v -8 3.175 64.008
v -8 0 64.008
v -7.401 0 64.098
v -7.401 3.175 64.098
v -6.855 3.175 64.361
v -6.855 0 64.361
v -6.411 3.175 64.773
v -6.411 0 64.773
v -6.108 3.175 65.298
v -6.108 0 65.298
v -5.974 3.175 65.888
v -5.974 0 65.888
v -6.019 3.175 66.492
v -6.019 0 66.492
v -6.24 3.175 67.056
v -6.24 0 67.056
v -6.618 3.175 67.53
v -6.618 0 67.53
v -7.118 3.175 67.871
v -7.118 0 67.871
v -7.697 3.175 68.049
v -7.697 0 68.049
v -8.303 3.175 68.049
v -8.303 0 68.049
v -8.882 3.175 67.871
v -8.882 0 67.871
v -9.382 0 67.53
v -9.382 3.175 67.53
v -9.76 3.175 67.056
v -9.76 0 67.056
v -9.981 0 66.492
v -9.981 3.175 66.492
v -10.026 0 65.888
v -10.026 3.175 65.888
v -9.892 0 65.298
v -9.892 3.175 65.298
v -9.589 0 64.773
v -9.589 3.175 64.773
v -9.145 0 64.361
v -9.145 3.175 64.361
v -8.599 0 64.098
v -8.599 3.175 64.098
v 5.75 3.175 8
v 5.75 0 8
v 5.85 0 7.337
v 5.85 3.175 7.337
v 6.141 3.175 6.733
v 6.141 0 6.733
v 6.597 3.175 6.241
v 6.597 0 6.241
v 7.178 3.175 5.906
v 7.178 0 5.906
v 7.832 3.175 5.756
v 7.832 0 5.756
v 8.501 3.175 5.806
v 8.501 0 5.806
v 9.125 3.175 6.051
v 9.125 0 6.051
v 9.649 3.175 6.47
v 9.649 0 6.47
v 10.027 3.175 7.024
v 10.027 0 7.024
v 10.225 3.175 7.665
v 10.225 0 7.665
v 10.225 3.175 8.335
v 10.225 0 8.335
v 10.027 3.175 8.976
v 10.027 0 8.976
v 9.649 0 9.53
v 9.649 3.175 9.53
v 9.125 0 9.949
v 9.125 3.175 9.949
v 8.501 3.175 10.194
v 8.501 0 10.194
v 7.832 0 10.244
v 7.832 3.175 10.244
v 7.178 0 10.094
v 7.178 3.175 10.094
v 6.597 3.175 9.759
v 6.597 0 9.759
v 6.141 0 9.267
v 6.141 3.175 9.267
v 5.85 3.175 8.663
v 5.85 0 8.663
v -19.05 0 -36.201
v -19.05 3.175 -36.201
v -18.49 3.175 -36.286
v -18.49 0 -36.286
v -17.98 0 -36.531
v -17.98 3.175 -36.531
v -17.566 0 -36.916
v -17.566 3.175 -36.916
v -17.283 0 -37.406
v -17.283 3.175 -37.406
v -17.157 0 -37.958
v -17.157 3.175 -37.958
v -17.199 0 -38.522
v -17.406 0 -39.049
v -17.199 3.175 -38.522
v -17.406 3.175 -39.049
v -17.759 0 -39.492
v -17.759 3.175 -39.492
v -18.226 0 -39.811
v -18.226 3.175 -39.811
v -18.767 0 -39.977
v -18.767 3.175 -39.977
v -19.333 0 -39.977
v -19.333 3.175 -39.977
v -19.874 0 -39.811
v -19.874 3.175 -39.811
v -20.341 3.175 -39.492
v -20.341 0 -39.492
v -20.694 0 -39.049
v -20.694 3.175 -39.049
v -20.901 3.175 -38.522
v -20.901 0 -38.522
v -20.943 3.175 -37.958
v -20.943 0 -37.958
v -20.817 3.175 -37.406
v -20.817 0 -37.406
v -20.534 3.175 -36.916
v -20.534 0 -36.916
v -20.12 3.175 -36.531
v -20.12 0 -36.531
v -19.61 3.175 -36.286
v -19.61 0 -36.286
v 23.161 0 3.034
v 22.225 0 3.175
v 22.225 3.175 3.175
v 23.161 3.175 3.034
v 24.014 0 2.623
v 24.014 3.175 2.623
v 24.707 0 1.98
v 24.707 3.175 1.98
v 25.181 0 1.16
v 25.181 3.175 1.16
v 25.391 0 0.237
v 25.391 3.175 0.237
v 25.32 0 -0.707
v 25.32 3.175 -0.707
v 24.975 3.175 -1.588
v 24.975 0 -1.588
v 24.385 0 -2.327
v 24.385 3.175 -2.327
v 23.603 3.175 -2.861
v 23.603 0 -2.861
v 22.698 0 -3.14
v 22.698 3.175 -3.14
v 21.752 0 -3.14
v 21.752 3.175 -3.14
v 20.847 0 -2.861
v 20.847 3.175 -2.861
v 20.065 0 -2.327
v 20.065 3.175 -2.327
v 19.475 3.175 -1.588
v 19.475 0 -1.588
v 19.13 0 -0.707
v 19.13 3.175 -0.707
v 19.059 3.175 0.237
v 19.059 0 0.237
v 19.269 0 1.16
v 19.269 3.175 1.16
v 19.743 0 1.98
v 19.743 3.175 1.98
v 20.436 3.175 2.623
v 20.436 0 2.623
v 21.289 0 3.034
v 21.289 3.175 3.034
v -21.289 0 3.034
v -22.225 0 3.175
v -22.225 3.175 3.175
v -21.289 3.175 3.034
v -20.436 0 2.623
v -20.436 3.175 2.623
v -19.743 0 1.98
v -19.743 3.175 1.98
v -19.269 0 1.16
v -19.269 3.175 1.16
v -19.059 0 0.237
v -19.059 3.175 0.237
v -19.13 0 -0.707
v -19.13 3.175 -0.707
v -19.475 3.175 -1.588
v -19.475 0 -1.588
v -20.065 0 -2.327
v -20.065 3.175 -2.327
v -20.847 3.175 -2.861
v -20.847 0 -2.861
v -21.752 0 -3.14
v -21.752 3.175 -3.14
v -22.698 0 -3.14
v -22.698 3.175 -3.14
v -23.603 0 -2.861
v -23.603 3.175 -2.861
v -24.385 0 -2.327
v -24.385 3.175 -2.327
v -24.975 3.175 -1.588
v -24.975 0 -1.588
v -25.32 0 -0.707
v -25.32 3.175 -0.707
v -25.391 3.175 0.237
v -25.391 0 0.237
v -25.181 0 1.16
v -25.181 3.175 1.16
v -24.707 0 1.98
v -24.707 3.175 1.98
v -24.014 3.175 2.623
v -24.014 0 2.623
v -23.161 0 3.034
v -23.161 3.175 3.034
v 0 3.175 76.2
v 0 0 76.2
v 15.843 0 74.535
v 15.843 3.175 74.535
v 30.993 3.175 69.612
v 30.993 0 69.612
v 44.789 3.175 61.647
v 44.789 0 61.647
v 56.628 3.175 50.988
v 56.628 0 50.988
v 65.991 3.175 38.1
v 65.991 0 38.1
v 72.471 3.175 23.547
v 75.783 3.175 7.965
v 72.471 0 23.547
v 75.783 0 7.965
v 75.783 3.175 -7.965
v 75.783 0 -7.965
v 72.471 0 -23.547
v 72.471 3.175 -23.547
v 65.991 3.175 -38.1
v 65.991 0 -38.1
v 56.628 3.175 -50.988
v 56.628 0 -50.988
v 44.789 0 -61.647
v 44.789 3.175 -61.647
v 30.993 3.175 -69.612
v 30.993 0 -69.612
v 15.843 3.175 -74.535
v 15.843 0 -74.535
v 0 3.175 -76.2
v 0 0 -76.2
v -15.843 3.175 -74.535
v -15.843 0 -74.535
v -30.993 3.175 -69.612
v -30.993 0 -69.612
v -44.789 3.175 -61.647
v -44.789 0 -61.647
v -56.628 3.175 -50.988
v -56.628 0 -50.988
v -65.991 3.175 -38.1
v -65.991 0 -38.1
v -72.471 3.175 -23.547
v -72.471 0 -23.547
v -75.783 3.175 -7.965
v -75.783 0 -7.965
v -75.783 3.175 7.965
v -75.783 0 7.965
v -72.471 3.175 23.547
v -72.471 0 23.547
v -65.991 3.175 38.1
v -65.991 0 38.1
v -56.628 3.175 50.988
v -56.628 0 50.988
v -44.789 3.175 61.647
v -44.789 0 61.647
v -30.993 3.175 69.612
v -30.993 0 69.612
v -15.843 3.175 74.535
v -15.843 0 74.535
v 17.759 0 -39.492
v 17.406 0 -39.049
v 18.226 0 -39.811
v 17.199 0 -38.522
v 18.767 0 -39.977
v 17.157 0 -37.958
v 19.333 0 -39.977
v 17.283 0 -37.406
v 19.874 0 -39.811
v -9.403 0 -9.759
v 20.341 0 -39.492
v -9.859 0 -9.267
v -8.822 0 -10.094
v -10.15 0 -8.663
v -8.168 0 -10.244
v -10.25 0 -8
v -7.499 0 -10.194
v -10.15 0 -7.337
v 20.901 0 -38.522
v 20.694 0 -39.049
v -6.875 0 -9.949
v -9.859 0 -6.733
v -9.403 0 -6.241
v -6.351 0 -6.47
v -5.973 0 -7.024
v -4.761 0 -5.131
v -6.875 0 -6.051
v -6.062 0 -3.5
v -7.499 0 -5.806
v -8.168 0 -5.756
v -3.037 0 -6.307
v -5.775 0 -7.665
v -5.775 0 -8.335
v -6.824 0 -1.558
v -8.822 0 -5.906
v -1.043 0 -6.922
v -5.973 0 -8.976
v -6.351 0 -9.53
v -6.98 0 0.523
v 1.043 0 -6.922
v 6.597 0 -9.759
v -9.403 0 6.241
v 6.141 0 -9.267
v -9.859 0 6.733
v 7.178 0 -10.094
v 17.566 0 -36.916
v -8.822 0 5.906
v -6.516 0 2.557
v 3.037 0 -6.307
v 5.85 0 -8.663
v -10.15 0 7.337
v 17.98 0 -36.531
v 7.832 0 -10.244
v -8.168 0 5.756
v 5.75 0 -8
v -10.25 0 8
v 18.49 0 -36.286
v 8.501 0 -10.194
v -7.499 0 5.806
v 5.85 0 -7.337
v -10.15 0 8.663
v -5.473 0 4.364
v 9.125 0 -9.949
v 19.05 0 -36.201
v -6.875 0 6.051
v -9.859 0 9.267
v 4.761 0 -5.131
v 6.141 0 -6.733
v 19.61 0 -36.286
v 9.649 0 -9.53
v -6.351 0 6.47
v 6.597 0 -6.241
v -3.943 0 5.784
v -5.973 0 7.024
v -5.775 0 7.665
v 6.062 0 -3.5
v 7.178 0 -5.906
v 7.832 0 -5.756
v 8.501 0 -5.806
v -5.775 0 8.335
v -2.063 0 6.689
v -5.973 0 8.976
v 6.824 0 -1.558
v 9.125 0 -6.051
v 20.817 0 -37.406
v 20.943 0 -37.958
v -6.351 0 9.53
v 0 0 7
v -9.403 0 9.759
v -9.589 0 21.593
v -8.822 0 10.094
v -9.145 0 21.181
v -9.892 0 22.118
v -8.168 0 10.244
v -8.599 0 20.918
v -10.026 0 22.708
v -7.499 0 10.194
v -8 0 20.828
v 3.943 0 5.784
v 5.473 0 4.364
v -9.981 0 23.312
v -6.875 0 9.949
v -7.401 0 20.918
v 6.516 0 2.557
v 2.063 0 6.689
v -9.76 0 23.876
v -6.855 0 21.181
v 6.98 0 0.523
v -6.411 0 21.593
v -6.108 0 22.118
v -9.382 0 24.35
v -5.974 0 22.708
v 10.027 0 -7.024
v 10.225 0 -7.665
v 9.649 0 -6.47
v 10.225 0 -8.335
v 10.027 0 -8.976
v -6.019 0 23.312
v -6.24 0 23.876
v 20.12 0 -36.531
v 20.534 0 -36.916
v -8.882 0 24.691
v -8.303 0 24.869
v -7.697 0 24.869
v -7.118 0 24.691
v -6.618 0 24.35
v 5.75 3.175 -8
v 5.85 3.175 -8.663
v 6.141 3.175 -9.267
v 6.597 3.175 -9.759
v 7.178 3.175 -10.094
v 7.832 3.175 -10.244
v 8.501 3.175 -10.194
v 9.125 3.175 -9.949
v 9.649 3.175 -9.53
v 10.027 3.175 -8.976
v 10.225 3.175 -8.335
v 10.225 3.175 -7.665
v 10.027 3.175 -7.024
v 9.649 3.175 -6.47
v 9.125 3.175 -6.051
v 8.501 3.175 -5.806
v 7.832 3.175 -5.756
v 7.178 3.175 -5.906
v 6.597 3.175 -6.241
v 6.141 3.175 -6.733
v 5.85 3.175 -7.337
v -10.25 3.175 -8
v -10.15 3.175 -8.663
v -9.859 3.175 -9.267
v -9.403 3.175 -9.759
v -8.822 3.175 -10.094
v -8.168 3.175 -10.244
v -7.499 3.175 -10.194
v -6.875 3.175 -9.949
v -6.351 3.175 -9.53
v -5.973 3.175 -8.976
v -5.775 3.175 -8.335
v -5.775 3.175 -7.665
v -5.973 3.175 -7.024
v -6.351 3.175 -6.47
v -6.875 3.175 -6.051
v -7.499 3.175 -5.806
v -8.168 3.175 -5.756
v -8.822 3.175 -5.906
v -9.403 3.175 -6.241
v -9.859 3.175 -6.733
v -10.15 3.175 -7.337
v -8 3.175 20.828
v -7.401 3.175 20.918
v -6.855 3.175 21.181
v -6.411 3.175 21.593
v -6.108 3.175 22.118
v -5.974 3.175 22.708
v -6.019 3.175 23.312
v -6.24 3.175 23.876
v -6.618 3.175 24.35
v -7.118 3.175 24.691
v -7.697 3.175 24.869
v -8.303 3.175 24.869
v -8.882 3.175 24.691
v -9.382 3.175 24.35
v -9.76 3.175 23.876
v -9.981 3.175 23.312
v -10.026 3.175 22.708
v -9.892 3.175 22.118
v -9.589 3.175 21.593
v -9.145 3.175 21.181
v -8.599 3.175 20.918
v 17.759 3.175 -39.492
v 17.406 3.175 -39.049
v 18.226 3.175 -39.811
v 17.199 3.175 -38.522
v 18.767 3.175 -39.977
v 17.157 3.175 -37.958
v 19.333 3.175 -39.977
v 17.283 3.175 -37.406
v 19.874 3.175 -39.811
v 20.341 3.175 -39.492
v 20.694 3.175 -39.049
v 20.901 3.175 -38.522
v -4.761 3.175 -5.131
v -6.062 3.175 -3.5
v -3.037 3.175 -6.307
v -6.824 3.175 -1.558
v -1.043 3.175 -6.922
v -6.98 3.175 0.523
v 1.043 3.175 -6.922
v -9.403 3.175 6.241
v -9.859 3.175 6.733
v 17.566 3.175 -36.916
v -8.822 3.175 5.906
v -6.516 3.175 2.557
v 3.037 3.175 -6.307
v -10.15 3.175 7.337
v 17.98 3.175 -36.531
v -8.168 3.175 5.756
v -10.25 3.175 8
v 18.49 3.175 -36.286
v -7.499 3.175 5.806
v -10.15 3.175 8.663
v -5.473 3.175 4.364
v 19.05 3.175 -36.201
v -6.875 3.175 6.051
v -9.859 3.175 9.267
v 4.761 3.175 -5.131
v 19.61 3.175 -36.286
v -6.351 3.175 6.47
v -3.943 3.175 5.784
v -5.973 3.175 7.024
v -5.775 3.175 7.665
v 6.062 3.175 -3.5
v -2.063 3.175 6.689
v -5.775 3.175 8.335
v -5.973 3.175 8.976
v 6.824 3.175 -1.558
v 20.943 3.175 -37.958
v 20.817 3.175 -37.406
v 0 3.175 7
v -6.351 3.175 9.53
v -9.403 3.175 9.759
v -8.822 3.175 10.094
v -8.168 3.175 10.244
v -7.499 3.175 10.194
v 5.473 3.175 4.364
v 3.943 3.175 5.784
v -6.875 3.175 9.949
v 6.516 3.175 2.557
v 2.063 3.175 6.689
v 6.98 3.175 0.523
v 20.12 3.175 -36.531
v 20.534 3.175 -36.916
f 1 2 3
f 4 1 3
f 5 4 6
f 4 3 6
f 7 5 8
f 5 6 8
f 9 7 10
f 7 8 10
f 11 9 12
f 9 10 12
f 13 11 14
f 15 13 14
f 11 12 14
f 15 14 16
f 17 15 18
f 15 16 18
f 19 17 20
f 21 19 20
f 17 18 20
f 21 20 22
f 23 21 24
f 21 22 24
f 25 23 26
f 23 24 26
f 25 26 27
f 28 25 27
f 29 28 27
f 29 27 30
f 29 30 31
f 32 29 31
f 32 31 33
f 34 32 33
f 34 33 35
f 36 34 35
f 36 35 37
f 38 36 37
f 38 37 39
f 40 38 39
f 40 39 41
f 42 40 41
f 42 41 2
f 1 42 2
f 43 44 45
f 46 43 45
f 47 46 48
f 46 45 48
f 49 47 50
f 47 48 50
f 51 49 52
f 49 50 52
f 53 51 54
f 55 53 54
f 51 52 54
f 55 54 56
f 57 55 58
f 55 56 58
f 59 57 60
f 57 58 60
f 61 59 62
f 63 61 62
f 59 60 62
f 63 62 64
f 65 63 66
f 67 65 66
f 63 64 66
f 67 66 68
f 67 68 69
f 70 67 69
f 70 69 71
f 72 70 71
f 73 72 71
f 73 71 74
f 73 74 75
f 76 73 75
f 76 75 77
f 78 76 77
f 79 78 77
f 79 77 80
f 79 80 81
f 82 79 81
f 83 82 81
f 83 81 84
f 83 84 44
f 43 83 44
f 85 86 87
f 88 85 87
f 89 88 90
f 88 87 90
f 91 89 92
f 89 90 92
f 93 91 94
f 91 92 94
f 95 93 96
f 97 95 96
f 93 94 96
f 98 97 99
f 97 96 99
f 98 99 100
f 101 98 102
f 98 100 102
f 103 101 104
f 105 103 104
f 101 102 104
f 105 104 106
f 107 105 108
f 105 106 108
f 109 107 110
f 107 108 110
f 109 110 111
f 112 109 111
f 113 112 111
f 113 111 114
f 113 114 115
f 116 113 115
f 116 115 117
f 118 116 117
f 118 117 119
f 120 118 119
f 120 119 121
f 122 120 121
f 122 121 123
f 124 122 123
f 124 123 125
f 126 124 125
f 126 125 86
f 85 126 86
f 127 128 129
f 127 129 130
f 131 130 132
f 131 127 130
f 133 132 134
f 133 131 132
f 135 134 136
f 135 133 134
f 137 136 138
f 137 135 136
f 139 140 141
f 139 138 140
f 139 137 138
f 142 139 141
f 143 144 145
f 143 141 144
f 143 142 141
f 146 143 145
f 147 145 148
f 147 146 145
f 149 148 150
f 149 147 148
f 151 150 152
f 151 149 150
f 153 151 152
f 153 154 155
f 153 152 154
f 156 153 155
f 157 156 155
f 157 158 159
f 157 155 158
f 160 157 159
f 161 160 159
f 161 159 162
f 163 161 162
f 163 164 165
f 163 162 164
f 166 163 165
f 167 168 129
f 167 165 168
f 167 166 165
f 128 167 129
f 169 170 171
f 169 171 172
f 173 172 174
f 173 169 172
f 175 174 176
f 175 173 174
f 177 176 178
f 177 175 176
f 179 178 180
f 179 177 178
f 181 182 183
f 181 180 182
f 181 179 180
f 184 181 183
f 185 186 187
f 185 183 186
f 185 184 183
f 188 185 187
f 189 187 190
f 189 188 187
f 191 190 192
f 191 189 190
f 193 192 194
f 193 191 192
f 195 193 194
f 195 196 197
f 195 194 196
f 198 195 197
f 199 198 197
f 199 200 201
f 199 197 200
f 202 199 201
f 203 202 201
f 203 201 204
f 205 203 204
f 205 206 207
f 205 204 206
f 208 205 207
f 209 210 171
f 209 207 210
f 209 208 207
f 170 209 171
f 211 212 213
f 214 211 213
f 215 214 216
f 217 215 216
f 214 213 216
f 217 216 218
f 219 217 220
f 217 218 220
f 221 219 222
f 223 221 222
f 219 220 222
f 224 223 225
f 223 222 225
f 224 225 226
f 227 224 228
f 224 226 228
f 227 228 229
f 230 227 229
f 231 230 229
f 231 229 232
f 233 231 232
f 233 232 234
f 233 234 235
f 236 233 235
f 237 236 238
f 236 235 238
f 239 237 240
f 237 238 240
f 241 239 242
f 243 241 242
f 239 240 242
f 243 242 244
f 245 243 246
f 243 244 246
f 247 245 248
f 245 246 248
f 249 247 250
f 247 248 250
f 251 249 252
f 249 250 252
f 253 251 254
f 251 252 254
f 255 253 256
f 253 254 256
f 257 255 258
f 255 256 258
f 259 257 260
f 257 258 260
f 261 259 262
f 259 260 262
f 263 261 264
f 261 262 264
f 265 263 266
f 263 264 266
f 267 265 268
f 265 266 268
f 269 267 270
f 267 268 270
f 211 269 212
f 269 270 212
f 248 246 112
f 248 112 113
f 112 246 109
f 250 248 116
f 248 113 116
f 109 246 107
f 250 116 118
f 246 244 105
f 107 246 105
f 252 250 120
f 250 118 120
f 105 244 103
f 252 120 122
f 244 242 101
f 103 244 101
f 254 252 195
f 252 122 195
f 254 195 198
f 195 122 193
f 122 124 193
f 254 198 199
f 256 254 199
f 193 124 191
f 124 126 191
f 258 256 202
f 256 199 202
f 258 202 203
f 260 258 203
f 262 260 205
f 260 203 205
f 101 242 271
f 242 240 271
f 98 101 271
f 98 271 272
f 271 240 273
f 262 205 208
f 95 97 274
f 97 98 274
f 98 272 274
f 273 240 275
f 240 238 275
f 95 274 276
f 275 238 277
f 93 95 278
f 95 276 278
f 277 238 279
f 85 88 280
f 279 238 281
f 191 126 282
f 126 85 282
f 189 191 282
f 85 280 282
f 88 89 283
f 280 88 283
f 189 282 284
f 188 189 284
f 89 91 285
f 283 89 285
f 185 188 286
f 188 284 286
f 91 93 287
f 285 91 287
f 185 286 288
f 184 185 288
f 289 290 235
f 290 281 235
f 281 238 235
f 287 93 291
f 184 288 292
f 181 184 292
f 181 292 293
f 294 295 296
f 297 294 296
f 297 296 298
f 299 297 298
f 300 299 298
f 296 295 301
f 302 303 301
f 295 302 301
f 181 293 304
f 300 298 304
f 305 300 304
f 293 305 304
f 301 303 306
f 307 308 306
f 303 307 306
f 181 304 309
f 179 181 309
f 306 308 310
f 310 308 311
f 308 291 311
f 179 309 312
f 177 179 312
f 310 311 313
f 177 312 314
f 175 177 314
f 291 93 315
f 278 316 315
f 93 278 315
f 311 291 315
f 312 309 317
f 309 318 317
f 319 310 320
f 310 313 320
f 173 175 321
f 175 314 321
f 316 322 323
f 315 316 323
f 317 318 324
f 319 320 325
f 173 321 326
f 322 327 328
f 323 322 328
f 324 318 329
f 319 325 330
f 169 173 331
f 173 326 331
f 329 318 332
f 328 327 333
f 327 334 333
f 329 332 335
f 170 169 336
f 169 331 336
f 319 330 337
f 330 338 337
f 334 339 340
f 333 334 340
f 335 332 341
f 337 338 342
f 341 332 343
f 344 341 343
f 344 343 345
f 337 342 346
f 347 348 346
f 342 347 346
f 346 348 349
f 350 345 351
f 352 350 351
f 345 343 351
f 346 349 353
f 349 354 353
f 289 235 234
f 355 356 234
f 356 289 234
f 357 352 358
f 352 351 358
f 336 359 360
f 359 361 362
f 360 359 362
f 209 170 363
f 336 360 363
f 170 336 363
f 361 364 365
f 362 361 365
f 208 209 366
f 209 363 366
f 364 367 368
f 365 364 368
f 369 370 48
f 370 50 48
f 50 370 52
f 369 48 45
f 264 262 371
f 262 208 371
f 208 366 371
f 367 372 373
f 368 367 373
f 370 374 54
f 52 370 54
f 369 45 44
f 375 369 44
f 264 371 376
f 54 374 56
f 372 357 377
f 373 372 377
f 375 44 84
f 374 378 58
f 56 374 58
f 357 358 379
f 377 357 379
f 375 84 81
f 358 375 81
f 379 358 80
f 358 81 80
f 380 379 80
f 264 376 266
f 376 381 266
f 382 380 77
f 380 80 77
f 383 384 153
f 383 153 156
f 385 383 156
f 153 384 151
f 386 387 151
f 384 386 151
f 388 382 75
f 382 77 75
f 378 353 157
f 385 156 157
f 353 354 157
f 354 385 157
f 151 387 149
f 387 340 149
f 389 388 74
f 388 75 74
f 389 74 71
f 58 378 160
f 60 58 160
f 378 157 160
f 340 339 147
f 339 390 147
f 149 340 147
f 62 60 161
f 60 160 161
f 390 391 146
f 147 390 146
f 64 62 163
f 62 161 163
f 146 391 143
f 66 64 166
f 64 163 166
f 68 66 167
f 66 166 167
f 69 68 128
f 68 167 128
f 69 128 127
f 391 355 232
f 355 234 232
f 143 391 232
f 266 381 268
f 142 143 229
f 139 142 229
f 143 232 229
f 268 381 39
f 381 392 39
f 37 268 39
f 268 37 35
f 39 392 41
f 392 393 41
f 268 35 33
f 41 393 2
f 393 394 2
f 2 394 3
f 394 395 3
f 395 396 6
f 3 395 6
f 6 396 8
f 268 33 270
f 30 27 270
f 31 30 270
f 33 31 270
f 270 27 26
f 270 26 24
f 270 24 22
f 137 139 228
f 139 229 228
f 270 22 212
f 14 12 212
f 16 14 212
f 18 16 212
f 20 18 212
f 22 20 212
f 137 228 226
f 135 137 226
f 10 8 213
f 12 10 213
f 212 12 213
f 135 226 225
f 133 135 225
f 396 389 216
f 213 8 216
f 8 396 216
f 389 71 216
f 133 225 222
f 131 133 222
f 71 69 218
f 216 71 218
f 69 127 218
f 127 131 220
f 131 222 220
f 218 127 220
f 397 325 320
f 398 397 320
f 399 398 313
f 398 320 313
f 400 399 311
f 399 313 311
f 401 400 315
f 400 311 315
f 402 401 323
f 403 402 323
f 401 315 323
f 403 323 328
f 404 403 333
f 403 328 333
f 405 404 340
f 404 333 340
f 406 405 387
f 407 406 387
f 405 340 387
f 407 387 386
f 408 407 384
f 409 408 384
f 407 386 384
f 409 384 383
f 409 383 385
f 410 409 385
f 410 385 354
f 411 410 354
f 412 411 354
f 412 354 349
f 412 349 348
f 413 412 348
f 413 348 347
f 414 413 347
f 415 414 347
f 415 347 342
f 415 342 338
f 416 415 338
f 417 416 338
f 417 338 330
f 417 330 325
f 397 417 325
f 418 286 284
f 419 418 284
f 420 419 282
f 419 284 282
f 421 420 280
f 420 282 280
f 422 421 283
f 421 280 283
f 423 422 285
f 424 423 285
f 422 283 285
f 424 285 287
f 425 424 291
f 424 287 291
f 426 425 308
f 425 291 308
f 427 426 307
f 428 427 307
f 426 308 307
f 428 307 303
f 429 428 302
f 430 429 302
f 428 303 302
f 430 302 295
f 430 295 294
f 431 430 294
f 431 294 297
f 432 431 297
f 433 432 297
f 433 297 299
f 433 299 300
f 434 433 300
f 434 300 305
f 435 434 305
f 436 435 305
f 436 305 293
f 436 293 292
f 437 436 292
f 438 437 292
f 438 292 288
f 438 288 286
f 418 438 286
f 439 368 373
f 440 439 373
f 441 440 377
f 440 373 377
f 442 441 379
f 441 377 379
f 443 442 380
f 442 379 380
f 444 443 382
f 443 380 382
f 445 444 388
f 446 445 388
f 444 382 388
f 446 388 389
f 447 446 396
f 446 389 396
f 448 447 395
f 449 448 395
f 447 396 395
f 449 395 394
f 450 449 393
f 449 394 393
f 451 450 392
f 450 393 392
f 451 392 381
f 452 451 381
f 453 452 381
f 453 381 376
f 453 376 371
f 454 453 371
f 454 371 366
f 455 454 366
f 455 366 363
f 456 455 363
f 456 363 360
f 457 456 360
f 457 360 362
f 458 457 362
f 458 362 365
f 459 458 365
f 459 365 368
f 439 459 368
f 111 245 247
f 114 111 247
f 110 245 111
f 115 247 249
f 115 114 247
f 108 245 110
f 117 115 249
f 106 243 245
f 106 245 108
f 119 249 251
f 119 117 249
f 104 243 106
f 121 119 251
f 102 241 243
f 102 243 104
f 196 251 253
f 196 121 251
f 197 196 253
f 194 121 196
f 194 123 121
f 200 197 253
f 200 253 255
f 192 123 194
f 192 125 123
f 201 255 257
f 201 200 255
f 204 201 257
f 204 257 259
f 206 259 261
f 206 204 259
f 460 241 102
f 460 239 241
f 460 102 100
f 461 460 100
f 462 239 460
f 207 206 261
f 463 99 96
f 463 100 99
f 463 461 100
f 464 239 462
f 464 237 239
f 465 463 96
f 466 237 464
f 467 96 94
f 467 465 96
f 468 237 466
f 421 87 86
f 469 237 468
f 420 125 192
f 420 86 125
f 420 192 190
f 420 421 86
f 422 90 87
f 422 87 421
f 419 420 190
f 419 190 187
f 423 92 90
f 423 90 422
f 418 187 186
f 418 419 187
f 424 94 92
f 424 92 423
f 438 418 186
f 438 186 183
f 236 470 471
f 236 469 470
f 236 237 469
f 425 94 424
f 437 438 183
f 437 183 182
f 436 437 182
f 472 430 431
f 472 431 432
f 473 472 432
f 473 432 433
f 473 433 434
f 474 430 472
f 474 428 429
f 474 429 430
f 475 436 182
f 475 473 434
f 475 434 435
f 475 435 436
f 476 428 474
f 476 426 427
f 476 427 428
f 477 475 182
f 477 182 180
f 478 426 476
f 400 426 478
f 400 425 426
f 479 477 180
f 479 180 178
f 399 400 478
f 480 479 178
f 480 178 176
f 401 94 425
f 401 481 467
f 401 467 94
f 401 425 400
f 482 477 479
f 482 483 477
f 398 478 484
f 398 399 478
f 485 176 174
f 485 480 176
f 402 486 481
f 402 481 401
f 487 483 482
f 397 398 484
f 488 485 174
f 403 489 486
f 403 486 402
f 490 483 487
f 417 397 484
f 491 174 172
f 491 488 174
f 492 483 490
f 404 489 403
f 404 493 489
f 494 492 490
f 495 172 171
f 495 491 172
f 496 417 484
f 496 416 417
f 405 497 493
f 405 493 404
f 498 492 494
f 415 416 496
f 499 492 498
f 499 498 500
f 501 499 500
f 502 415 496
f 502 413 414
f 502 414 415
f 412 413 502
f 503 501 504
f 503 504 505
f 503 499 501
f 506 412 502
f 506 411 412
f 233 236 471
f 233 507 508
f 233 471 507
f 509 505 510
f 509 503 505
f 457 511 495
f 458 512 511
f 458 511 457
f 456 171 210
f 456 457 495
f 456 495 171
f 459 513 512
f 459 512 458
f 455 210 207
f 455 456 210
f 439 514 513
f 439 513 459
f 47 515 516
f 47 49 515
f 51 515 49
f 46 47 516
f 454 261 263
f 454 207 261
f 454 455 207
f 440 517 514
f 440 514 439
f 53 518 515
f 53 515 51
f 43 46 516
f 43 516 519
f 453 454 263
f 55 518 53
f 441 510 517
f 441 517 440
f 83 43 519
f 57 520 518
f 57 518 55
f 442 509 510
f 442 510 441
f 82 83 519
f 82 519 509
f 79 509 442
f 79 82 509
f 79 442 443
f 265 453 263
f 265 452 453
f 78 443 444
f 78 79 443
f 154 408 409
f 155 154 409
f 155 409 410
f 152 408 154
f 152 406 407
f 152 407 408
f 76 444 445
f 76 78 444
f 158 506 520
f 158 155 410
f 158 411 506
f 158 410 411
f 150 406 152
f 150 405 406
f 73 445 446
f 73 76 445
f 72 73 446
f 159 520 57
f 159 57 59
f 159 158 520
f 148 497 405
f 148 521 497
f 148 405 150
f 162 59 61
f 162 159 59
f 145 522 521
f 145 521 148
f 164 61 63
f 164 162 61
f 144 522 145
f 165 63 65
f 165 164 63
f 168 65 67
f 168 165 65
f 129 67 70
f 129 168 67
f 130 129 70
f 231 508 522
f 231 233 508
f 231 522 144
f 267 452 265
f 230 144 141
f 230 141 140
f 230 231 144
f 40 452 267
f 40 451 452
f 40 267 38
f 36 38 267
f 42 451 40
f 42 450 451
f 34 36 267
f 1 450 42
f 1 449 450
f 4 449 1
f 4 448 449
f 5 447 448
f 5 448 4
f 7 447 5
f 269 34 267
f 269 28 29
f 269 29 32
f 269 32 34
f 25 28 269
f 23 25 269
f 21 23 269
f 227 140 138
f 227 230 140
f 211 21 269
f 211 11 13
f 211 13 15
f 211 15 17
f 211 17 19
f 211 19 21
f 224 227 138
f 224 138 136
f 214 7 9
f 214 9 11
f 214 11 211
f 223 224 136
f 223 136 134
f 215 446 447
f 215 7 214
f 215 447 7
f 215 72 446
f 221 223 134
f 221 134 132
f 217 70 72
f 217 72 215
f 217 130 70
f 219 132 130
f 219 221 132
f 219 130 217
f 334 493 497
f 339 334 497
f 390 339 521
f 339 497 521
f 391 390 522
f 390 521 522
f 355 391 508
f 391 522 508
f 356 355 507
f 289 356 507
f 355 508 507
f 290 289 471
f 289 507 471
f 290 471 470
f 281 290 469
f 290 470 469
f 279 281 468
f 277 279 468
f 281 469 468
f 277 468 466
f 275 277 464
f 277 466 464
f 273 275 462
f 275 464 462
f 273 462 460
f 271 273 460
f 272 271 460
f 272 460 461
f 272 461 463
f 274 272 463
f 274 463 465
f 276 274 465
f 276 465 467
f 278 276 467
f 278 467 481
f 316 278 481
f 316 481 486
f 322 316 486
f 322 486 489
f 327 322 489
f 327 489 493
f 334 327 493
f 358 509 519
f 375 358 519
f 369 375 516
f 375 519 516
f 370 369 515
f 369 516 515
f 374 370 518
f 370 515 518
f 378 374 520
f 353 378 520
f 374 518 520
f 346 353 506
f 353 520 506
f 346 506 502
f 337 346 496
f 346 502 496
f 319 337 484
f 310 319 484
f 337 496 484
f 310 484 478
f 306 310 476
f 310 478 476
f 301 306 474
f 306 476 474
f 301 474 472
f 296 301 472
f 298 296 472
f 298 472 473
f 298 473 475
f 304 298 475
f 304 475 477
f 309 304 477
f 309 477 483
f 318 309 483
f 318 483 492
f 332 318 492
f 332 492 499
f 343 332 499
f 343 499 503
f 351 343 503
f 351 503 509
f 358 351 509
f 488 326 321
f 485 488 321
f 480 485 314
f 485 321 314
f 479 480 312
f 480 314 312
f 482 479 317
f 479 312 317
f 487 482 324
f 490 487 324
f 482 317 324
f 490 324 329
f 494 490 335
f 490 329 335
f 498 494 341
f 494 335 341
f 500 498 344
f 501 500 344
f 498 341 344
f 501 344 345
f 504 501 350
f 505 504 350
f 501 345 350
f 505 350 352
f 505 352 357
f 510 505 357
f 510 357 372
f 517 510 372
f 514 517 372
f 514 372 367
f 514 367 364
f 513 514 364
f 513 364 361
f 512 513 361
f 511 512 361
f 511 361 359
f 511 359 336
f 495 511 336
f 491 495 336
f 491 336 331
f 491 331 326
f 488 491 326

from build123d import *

# Parameters (mm, degrees)
SKETCH1_R               = 76.2
BOSS_EXTRUDE1_DEPTH     = 3.175
CUT_EXTRUDE1_REACH      = 109.81
SKETCH2_R               = 7
CUT_EXTRUDE3_DEPTH      = 108.809835474
CUT_EXTRUDE3_DEPTH_BACK = 108.809835474
SKETCH4_R               = 3.175
M4_CLEARANCE_HOLE1_D    = 4.5
CUT_EXTRUDE4_REACH      = 109.81
SKETCH8_R               = 1.89865
CUT_EXTRUDE5_REACH      = 109.81
SKETCH9_R               = 2.032


with BuildPart() as part:
    # Sketch1 → Boss-Extrude1 (new body)
    with BuildSketch(Plane(origin=(0, 0, 0), x_dir=(1, 0, 0), z_dir=(0, 1, 0))):
        with Locations(Location((0, 0, 0), (0, 0, 270))):
            Circle(SKETCH1_R)
    extrude(amount=BOSS_EXTRUDE1_DEPTH)

    # Sketch2 → Cut-Extrude1 (cut, up to next)
    with BuildSketch(Plane(origin=(0, 3.175, 0), x_dir=(1, 0, 0), z_dir=(0, 1, 0)), mode=Mode.PRIVATE) as cut_extrude1_sk1:
        with Locations(Location((0, 0, 0), (0, 0, 270))):
            Circle(SKETCH2_R)
    cut_extrude1_tool1 = extrude(cut_extrude1_sk1.sketch, amount=-CUT_EXTRUDE1_REACH, mode=Mode.PRIVATE) & part.part
    add(cut_extrude1_tool1.solids().sort_by_distance((0, 3.175, 0))[0], mode=Mode.SUBTRACT)

    # Sketch4 → Cut-Extrude3 (cut, two sides: drawn at the far end of the back side and taken through both)
    with BuildSketch(Plane(origin=(0, 3.175, 0), x_dir=(1, 0, 0), z_dir=(0, 1, 0)).offset(-CUT_EXTRUDE3_DEPTH_BACK)):
        with Locations(Location((-22.225, 0, 0), (0, 0, 270))):
            Circle(SKETCH4_R)
        with Locations(Location((22.225, 0, 0), (0, 0, 270))):
            Circle(SKETCH4_R)
    extrude(amount=CUT_EXTRUDE3_DEPTH + CUT_EXTRUDE3_DEPTH_BACK, mode=Mode.SUBTRACT)

    # M4 Clearance Hole1 (through all)
    with Locations(Plane(origin=(0, 3.175, 0), x_dir=(1, 0, 0), z_dir=(0, 1, 0))):
        with Locations((-8, 8), (8, 8), (8, -8), (-8, -8)):
            Hole(M4_CLEARANCE_HOLE1_D / 2)

    # Sketch8 → Cut-Extrude4 (cut, up to next)
    with BuildSketch(Plane(origin=(0, 3.175, 0), x_dir=(1, 0, 0), z_dir=(0, 1, 0)), mode=Mode.PRIVATE) as cut_extrude4_sk1:
        with Locations(Location((19.05, 38.1, 0), (0, 0, 270))):
            Circle(SKETCH8_R)
    cut_extrude4_tool1 = extrude(cut_extrude4_sk1.sketch, amount=-CUT_EXTRUDE4_REACH, mode=Mode.PRIVATE) & part.part
    # Sketch8 → Cut-Extrude4 (cut, up to next)
    with BuildSketch(Plane(origin=(0, 3.175, 0), x_dir=(1, 0, 0), z_dir=(0, 1, 0)), mode=Mode.PRIVATE) as cut_extrude4_sk2:
        with Locations(Location((-19.05, 38.1, 0), (0, 0, 270))):
            Circle(SKETCH8_R)
    cut_extrude4_tool2 = extrude(cut_extrude4_sk2.sketch, amount=-CUT_EXTRUDE4_REACH, mode=Mode.PRIVATE) & part.part
    add(cut_extrude4_tool1.solids().sort_by_distance((19.05, 3.175, -38.1))[0], mode=Mode.SUBTRACT)
    add(cut_extrude4_tool2.solids().sort_by_distance((-19.05, 3.175, -38.1))[0], mode=Mode.SUBTRACT)

    # Sketch9 → Cut-Extrude5 (cut, up to next)
    with BuildSketch(Plane.XZ, mode=Mode.PRIVATE) as cut_extrude5_sk1:
        with Locations(Location((-8, 22.86, 0), (0, 0, 270))):
            Circle(SKETCH9_R)
    cut_extrude5_tool1 = extrude(cut_extrude5_sk1.sketch, amount=-CUT_EXTRUDE5_REACH, mode=Mode.PRIVATE) & part.part
    # Sketch9 → Cut-Extrude5 (cut, up to next)
    with BuildSketch(Plane.XZ, mode=Mode.PRIVATE) as cut_extrude5_sk2:
        with Locations(Location((-8, 66.04, 0), (0, 0, 270))):
            Circle(SKETCH9_R)
    cut_extrude5_tool2 = extrude(cut_extrude5_sk2.sketch, amount=-CUT_EXTRUDE5_REACH, mode=Mode.PRIVATE) & part.part
    add(cut_extrude5_tool1.solids().sort_by_distance((-8, 0, 22.86))[0], mode=Mode.SUBTRACT)
    add(cut_extrude5_tool2.solids().sort_by_distance((-8, 0, 66.04))[0], mode=Mode.SUBTRACT)


solid = part.part
